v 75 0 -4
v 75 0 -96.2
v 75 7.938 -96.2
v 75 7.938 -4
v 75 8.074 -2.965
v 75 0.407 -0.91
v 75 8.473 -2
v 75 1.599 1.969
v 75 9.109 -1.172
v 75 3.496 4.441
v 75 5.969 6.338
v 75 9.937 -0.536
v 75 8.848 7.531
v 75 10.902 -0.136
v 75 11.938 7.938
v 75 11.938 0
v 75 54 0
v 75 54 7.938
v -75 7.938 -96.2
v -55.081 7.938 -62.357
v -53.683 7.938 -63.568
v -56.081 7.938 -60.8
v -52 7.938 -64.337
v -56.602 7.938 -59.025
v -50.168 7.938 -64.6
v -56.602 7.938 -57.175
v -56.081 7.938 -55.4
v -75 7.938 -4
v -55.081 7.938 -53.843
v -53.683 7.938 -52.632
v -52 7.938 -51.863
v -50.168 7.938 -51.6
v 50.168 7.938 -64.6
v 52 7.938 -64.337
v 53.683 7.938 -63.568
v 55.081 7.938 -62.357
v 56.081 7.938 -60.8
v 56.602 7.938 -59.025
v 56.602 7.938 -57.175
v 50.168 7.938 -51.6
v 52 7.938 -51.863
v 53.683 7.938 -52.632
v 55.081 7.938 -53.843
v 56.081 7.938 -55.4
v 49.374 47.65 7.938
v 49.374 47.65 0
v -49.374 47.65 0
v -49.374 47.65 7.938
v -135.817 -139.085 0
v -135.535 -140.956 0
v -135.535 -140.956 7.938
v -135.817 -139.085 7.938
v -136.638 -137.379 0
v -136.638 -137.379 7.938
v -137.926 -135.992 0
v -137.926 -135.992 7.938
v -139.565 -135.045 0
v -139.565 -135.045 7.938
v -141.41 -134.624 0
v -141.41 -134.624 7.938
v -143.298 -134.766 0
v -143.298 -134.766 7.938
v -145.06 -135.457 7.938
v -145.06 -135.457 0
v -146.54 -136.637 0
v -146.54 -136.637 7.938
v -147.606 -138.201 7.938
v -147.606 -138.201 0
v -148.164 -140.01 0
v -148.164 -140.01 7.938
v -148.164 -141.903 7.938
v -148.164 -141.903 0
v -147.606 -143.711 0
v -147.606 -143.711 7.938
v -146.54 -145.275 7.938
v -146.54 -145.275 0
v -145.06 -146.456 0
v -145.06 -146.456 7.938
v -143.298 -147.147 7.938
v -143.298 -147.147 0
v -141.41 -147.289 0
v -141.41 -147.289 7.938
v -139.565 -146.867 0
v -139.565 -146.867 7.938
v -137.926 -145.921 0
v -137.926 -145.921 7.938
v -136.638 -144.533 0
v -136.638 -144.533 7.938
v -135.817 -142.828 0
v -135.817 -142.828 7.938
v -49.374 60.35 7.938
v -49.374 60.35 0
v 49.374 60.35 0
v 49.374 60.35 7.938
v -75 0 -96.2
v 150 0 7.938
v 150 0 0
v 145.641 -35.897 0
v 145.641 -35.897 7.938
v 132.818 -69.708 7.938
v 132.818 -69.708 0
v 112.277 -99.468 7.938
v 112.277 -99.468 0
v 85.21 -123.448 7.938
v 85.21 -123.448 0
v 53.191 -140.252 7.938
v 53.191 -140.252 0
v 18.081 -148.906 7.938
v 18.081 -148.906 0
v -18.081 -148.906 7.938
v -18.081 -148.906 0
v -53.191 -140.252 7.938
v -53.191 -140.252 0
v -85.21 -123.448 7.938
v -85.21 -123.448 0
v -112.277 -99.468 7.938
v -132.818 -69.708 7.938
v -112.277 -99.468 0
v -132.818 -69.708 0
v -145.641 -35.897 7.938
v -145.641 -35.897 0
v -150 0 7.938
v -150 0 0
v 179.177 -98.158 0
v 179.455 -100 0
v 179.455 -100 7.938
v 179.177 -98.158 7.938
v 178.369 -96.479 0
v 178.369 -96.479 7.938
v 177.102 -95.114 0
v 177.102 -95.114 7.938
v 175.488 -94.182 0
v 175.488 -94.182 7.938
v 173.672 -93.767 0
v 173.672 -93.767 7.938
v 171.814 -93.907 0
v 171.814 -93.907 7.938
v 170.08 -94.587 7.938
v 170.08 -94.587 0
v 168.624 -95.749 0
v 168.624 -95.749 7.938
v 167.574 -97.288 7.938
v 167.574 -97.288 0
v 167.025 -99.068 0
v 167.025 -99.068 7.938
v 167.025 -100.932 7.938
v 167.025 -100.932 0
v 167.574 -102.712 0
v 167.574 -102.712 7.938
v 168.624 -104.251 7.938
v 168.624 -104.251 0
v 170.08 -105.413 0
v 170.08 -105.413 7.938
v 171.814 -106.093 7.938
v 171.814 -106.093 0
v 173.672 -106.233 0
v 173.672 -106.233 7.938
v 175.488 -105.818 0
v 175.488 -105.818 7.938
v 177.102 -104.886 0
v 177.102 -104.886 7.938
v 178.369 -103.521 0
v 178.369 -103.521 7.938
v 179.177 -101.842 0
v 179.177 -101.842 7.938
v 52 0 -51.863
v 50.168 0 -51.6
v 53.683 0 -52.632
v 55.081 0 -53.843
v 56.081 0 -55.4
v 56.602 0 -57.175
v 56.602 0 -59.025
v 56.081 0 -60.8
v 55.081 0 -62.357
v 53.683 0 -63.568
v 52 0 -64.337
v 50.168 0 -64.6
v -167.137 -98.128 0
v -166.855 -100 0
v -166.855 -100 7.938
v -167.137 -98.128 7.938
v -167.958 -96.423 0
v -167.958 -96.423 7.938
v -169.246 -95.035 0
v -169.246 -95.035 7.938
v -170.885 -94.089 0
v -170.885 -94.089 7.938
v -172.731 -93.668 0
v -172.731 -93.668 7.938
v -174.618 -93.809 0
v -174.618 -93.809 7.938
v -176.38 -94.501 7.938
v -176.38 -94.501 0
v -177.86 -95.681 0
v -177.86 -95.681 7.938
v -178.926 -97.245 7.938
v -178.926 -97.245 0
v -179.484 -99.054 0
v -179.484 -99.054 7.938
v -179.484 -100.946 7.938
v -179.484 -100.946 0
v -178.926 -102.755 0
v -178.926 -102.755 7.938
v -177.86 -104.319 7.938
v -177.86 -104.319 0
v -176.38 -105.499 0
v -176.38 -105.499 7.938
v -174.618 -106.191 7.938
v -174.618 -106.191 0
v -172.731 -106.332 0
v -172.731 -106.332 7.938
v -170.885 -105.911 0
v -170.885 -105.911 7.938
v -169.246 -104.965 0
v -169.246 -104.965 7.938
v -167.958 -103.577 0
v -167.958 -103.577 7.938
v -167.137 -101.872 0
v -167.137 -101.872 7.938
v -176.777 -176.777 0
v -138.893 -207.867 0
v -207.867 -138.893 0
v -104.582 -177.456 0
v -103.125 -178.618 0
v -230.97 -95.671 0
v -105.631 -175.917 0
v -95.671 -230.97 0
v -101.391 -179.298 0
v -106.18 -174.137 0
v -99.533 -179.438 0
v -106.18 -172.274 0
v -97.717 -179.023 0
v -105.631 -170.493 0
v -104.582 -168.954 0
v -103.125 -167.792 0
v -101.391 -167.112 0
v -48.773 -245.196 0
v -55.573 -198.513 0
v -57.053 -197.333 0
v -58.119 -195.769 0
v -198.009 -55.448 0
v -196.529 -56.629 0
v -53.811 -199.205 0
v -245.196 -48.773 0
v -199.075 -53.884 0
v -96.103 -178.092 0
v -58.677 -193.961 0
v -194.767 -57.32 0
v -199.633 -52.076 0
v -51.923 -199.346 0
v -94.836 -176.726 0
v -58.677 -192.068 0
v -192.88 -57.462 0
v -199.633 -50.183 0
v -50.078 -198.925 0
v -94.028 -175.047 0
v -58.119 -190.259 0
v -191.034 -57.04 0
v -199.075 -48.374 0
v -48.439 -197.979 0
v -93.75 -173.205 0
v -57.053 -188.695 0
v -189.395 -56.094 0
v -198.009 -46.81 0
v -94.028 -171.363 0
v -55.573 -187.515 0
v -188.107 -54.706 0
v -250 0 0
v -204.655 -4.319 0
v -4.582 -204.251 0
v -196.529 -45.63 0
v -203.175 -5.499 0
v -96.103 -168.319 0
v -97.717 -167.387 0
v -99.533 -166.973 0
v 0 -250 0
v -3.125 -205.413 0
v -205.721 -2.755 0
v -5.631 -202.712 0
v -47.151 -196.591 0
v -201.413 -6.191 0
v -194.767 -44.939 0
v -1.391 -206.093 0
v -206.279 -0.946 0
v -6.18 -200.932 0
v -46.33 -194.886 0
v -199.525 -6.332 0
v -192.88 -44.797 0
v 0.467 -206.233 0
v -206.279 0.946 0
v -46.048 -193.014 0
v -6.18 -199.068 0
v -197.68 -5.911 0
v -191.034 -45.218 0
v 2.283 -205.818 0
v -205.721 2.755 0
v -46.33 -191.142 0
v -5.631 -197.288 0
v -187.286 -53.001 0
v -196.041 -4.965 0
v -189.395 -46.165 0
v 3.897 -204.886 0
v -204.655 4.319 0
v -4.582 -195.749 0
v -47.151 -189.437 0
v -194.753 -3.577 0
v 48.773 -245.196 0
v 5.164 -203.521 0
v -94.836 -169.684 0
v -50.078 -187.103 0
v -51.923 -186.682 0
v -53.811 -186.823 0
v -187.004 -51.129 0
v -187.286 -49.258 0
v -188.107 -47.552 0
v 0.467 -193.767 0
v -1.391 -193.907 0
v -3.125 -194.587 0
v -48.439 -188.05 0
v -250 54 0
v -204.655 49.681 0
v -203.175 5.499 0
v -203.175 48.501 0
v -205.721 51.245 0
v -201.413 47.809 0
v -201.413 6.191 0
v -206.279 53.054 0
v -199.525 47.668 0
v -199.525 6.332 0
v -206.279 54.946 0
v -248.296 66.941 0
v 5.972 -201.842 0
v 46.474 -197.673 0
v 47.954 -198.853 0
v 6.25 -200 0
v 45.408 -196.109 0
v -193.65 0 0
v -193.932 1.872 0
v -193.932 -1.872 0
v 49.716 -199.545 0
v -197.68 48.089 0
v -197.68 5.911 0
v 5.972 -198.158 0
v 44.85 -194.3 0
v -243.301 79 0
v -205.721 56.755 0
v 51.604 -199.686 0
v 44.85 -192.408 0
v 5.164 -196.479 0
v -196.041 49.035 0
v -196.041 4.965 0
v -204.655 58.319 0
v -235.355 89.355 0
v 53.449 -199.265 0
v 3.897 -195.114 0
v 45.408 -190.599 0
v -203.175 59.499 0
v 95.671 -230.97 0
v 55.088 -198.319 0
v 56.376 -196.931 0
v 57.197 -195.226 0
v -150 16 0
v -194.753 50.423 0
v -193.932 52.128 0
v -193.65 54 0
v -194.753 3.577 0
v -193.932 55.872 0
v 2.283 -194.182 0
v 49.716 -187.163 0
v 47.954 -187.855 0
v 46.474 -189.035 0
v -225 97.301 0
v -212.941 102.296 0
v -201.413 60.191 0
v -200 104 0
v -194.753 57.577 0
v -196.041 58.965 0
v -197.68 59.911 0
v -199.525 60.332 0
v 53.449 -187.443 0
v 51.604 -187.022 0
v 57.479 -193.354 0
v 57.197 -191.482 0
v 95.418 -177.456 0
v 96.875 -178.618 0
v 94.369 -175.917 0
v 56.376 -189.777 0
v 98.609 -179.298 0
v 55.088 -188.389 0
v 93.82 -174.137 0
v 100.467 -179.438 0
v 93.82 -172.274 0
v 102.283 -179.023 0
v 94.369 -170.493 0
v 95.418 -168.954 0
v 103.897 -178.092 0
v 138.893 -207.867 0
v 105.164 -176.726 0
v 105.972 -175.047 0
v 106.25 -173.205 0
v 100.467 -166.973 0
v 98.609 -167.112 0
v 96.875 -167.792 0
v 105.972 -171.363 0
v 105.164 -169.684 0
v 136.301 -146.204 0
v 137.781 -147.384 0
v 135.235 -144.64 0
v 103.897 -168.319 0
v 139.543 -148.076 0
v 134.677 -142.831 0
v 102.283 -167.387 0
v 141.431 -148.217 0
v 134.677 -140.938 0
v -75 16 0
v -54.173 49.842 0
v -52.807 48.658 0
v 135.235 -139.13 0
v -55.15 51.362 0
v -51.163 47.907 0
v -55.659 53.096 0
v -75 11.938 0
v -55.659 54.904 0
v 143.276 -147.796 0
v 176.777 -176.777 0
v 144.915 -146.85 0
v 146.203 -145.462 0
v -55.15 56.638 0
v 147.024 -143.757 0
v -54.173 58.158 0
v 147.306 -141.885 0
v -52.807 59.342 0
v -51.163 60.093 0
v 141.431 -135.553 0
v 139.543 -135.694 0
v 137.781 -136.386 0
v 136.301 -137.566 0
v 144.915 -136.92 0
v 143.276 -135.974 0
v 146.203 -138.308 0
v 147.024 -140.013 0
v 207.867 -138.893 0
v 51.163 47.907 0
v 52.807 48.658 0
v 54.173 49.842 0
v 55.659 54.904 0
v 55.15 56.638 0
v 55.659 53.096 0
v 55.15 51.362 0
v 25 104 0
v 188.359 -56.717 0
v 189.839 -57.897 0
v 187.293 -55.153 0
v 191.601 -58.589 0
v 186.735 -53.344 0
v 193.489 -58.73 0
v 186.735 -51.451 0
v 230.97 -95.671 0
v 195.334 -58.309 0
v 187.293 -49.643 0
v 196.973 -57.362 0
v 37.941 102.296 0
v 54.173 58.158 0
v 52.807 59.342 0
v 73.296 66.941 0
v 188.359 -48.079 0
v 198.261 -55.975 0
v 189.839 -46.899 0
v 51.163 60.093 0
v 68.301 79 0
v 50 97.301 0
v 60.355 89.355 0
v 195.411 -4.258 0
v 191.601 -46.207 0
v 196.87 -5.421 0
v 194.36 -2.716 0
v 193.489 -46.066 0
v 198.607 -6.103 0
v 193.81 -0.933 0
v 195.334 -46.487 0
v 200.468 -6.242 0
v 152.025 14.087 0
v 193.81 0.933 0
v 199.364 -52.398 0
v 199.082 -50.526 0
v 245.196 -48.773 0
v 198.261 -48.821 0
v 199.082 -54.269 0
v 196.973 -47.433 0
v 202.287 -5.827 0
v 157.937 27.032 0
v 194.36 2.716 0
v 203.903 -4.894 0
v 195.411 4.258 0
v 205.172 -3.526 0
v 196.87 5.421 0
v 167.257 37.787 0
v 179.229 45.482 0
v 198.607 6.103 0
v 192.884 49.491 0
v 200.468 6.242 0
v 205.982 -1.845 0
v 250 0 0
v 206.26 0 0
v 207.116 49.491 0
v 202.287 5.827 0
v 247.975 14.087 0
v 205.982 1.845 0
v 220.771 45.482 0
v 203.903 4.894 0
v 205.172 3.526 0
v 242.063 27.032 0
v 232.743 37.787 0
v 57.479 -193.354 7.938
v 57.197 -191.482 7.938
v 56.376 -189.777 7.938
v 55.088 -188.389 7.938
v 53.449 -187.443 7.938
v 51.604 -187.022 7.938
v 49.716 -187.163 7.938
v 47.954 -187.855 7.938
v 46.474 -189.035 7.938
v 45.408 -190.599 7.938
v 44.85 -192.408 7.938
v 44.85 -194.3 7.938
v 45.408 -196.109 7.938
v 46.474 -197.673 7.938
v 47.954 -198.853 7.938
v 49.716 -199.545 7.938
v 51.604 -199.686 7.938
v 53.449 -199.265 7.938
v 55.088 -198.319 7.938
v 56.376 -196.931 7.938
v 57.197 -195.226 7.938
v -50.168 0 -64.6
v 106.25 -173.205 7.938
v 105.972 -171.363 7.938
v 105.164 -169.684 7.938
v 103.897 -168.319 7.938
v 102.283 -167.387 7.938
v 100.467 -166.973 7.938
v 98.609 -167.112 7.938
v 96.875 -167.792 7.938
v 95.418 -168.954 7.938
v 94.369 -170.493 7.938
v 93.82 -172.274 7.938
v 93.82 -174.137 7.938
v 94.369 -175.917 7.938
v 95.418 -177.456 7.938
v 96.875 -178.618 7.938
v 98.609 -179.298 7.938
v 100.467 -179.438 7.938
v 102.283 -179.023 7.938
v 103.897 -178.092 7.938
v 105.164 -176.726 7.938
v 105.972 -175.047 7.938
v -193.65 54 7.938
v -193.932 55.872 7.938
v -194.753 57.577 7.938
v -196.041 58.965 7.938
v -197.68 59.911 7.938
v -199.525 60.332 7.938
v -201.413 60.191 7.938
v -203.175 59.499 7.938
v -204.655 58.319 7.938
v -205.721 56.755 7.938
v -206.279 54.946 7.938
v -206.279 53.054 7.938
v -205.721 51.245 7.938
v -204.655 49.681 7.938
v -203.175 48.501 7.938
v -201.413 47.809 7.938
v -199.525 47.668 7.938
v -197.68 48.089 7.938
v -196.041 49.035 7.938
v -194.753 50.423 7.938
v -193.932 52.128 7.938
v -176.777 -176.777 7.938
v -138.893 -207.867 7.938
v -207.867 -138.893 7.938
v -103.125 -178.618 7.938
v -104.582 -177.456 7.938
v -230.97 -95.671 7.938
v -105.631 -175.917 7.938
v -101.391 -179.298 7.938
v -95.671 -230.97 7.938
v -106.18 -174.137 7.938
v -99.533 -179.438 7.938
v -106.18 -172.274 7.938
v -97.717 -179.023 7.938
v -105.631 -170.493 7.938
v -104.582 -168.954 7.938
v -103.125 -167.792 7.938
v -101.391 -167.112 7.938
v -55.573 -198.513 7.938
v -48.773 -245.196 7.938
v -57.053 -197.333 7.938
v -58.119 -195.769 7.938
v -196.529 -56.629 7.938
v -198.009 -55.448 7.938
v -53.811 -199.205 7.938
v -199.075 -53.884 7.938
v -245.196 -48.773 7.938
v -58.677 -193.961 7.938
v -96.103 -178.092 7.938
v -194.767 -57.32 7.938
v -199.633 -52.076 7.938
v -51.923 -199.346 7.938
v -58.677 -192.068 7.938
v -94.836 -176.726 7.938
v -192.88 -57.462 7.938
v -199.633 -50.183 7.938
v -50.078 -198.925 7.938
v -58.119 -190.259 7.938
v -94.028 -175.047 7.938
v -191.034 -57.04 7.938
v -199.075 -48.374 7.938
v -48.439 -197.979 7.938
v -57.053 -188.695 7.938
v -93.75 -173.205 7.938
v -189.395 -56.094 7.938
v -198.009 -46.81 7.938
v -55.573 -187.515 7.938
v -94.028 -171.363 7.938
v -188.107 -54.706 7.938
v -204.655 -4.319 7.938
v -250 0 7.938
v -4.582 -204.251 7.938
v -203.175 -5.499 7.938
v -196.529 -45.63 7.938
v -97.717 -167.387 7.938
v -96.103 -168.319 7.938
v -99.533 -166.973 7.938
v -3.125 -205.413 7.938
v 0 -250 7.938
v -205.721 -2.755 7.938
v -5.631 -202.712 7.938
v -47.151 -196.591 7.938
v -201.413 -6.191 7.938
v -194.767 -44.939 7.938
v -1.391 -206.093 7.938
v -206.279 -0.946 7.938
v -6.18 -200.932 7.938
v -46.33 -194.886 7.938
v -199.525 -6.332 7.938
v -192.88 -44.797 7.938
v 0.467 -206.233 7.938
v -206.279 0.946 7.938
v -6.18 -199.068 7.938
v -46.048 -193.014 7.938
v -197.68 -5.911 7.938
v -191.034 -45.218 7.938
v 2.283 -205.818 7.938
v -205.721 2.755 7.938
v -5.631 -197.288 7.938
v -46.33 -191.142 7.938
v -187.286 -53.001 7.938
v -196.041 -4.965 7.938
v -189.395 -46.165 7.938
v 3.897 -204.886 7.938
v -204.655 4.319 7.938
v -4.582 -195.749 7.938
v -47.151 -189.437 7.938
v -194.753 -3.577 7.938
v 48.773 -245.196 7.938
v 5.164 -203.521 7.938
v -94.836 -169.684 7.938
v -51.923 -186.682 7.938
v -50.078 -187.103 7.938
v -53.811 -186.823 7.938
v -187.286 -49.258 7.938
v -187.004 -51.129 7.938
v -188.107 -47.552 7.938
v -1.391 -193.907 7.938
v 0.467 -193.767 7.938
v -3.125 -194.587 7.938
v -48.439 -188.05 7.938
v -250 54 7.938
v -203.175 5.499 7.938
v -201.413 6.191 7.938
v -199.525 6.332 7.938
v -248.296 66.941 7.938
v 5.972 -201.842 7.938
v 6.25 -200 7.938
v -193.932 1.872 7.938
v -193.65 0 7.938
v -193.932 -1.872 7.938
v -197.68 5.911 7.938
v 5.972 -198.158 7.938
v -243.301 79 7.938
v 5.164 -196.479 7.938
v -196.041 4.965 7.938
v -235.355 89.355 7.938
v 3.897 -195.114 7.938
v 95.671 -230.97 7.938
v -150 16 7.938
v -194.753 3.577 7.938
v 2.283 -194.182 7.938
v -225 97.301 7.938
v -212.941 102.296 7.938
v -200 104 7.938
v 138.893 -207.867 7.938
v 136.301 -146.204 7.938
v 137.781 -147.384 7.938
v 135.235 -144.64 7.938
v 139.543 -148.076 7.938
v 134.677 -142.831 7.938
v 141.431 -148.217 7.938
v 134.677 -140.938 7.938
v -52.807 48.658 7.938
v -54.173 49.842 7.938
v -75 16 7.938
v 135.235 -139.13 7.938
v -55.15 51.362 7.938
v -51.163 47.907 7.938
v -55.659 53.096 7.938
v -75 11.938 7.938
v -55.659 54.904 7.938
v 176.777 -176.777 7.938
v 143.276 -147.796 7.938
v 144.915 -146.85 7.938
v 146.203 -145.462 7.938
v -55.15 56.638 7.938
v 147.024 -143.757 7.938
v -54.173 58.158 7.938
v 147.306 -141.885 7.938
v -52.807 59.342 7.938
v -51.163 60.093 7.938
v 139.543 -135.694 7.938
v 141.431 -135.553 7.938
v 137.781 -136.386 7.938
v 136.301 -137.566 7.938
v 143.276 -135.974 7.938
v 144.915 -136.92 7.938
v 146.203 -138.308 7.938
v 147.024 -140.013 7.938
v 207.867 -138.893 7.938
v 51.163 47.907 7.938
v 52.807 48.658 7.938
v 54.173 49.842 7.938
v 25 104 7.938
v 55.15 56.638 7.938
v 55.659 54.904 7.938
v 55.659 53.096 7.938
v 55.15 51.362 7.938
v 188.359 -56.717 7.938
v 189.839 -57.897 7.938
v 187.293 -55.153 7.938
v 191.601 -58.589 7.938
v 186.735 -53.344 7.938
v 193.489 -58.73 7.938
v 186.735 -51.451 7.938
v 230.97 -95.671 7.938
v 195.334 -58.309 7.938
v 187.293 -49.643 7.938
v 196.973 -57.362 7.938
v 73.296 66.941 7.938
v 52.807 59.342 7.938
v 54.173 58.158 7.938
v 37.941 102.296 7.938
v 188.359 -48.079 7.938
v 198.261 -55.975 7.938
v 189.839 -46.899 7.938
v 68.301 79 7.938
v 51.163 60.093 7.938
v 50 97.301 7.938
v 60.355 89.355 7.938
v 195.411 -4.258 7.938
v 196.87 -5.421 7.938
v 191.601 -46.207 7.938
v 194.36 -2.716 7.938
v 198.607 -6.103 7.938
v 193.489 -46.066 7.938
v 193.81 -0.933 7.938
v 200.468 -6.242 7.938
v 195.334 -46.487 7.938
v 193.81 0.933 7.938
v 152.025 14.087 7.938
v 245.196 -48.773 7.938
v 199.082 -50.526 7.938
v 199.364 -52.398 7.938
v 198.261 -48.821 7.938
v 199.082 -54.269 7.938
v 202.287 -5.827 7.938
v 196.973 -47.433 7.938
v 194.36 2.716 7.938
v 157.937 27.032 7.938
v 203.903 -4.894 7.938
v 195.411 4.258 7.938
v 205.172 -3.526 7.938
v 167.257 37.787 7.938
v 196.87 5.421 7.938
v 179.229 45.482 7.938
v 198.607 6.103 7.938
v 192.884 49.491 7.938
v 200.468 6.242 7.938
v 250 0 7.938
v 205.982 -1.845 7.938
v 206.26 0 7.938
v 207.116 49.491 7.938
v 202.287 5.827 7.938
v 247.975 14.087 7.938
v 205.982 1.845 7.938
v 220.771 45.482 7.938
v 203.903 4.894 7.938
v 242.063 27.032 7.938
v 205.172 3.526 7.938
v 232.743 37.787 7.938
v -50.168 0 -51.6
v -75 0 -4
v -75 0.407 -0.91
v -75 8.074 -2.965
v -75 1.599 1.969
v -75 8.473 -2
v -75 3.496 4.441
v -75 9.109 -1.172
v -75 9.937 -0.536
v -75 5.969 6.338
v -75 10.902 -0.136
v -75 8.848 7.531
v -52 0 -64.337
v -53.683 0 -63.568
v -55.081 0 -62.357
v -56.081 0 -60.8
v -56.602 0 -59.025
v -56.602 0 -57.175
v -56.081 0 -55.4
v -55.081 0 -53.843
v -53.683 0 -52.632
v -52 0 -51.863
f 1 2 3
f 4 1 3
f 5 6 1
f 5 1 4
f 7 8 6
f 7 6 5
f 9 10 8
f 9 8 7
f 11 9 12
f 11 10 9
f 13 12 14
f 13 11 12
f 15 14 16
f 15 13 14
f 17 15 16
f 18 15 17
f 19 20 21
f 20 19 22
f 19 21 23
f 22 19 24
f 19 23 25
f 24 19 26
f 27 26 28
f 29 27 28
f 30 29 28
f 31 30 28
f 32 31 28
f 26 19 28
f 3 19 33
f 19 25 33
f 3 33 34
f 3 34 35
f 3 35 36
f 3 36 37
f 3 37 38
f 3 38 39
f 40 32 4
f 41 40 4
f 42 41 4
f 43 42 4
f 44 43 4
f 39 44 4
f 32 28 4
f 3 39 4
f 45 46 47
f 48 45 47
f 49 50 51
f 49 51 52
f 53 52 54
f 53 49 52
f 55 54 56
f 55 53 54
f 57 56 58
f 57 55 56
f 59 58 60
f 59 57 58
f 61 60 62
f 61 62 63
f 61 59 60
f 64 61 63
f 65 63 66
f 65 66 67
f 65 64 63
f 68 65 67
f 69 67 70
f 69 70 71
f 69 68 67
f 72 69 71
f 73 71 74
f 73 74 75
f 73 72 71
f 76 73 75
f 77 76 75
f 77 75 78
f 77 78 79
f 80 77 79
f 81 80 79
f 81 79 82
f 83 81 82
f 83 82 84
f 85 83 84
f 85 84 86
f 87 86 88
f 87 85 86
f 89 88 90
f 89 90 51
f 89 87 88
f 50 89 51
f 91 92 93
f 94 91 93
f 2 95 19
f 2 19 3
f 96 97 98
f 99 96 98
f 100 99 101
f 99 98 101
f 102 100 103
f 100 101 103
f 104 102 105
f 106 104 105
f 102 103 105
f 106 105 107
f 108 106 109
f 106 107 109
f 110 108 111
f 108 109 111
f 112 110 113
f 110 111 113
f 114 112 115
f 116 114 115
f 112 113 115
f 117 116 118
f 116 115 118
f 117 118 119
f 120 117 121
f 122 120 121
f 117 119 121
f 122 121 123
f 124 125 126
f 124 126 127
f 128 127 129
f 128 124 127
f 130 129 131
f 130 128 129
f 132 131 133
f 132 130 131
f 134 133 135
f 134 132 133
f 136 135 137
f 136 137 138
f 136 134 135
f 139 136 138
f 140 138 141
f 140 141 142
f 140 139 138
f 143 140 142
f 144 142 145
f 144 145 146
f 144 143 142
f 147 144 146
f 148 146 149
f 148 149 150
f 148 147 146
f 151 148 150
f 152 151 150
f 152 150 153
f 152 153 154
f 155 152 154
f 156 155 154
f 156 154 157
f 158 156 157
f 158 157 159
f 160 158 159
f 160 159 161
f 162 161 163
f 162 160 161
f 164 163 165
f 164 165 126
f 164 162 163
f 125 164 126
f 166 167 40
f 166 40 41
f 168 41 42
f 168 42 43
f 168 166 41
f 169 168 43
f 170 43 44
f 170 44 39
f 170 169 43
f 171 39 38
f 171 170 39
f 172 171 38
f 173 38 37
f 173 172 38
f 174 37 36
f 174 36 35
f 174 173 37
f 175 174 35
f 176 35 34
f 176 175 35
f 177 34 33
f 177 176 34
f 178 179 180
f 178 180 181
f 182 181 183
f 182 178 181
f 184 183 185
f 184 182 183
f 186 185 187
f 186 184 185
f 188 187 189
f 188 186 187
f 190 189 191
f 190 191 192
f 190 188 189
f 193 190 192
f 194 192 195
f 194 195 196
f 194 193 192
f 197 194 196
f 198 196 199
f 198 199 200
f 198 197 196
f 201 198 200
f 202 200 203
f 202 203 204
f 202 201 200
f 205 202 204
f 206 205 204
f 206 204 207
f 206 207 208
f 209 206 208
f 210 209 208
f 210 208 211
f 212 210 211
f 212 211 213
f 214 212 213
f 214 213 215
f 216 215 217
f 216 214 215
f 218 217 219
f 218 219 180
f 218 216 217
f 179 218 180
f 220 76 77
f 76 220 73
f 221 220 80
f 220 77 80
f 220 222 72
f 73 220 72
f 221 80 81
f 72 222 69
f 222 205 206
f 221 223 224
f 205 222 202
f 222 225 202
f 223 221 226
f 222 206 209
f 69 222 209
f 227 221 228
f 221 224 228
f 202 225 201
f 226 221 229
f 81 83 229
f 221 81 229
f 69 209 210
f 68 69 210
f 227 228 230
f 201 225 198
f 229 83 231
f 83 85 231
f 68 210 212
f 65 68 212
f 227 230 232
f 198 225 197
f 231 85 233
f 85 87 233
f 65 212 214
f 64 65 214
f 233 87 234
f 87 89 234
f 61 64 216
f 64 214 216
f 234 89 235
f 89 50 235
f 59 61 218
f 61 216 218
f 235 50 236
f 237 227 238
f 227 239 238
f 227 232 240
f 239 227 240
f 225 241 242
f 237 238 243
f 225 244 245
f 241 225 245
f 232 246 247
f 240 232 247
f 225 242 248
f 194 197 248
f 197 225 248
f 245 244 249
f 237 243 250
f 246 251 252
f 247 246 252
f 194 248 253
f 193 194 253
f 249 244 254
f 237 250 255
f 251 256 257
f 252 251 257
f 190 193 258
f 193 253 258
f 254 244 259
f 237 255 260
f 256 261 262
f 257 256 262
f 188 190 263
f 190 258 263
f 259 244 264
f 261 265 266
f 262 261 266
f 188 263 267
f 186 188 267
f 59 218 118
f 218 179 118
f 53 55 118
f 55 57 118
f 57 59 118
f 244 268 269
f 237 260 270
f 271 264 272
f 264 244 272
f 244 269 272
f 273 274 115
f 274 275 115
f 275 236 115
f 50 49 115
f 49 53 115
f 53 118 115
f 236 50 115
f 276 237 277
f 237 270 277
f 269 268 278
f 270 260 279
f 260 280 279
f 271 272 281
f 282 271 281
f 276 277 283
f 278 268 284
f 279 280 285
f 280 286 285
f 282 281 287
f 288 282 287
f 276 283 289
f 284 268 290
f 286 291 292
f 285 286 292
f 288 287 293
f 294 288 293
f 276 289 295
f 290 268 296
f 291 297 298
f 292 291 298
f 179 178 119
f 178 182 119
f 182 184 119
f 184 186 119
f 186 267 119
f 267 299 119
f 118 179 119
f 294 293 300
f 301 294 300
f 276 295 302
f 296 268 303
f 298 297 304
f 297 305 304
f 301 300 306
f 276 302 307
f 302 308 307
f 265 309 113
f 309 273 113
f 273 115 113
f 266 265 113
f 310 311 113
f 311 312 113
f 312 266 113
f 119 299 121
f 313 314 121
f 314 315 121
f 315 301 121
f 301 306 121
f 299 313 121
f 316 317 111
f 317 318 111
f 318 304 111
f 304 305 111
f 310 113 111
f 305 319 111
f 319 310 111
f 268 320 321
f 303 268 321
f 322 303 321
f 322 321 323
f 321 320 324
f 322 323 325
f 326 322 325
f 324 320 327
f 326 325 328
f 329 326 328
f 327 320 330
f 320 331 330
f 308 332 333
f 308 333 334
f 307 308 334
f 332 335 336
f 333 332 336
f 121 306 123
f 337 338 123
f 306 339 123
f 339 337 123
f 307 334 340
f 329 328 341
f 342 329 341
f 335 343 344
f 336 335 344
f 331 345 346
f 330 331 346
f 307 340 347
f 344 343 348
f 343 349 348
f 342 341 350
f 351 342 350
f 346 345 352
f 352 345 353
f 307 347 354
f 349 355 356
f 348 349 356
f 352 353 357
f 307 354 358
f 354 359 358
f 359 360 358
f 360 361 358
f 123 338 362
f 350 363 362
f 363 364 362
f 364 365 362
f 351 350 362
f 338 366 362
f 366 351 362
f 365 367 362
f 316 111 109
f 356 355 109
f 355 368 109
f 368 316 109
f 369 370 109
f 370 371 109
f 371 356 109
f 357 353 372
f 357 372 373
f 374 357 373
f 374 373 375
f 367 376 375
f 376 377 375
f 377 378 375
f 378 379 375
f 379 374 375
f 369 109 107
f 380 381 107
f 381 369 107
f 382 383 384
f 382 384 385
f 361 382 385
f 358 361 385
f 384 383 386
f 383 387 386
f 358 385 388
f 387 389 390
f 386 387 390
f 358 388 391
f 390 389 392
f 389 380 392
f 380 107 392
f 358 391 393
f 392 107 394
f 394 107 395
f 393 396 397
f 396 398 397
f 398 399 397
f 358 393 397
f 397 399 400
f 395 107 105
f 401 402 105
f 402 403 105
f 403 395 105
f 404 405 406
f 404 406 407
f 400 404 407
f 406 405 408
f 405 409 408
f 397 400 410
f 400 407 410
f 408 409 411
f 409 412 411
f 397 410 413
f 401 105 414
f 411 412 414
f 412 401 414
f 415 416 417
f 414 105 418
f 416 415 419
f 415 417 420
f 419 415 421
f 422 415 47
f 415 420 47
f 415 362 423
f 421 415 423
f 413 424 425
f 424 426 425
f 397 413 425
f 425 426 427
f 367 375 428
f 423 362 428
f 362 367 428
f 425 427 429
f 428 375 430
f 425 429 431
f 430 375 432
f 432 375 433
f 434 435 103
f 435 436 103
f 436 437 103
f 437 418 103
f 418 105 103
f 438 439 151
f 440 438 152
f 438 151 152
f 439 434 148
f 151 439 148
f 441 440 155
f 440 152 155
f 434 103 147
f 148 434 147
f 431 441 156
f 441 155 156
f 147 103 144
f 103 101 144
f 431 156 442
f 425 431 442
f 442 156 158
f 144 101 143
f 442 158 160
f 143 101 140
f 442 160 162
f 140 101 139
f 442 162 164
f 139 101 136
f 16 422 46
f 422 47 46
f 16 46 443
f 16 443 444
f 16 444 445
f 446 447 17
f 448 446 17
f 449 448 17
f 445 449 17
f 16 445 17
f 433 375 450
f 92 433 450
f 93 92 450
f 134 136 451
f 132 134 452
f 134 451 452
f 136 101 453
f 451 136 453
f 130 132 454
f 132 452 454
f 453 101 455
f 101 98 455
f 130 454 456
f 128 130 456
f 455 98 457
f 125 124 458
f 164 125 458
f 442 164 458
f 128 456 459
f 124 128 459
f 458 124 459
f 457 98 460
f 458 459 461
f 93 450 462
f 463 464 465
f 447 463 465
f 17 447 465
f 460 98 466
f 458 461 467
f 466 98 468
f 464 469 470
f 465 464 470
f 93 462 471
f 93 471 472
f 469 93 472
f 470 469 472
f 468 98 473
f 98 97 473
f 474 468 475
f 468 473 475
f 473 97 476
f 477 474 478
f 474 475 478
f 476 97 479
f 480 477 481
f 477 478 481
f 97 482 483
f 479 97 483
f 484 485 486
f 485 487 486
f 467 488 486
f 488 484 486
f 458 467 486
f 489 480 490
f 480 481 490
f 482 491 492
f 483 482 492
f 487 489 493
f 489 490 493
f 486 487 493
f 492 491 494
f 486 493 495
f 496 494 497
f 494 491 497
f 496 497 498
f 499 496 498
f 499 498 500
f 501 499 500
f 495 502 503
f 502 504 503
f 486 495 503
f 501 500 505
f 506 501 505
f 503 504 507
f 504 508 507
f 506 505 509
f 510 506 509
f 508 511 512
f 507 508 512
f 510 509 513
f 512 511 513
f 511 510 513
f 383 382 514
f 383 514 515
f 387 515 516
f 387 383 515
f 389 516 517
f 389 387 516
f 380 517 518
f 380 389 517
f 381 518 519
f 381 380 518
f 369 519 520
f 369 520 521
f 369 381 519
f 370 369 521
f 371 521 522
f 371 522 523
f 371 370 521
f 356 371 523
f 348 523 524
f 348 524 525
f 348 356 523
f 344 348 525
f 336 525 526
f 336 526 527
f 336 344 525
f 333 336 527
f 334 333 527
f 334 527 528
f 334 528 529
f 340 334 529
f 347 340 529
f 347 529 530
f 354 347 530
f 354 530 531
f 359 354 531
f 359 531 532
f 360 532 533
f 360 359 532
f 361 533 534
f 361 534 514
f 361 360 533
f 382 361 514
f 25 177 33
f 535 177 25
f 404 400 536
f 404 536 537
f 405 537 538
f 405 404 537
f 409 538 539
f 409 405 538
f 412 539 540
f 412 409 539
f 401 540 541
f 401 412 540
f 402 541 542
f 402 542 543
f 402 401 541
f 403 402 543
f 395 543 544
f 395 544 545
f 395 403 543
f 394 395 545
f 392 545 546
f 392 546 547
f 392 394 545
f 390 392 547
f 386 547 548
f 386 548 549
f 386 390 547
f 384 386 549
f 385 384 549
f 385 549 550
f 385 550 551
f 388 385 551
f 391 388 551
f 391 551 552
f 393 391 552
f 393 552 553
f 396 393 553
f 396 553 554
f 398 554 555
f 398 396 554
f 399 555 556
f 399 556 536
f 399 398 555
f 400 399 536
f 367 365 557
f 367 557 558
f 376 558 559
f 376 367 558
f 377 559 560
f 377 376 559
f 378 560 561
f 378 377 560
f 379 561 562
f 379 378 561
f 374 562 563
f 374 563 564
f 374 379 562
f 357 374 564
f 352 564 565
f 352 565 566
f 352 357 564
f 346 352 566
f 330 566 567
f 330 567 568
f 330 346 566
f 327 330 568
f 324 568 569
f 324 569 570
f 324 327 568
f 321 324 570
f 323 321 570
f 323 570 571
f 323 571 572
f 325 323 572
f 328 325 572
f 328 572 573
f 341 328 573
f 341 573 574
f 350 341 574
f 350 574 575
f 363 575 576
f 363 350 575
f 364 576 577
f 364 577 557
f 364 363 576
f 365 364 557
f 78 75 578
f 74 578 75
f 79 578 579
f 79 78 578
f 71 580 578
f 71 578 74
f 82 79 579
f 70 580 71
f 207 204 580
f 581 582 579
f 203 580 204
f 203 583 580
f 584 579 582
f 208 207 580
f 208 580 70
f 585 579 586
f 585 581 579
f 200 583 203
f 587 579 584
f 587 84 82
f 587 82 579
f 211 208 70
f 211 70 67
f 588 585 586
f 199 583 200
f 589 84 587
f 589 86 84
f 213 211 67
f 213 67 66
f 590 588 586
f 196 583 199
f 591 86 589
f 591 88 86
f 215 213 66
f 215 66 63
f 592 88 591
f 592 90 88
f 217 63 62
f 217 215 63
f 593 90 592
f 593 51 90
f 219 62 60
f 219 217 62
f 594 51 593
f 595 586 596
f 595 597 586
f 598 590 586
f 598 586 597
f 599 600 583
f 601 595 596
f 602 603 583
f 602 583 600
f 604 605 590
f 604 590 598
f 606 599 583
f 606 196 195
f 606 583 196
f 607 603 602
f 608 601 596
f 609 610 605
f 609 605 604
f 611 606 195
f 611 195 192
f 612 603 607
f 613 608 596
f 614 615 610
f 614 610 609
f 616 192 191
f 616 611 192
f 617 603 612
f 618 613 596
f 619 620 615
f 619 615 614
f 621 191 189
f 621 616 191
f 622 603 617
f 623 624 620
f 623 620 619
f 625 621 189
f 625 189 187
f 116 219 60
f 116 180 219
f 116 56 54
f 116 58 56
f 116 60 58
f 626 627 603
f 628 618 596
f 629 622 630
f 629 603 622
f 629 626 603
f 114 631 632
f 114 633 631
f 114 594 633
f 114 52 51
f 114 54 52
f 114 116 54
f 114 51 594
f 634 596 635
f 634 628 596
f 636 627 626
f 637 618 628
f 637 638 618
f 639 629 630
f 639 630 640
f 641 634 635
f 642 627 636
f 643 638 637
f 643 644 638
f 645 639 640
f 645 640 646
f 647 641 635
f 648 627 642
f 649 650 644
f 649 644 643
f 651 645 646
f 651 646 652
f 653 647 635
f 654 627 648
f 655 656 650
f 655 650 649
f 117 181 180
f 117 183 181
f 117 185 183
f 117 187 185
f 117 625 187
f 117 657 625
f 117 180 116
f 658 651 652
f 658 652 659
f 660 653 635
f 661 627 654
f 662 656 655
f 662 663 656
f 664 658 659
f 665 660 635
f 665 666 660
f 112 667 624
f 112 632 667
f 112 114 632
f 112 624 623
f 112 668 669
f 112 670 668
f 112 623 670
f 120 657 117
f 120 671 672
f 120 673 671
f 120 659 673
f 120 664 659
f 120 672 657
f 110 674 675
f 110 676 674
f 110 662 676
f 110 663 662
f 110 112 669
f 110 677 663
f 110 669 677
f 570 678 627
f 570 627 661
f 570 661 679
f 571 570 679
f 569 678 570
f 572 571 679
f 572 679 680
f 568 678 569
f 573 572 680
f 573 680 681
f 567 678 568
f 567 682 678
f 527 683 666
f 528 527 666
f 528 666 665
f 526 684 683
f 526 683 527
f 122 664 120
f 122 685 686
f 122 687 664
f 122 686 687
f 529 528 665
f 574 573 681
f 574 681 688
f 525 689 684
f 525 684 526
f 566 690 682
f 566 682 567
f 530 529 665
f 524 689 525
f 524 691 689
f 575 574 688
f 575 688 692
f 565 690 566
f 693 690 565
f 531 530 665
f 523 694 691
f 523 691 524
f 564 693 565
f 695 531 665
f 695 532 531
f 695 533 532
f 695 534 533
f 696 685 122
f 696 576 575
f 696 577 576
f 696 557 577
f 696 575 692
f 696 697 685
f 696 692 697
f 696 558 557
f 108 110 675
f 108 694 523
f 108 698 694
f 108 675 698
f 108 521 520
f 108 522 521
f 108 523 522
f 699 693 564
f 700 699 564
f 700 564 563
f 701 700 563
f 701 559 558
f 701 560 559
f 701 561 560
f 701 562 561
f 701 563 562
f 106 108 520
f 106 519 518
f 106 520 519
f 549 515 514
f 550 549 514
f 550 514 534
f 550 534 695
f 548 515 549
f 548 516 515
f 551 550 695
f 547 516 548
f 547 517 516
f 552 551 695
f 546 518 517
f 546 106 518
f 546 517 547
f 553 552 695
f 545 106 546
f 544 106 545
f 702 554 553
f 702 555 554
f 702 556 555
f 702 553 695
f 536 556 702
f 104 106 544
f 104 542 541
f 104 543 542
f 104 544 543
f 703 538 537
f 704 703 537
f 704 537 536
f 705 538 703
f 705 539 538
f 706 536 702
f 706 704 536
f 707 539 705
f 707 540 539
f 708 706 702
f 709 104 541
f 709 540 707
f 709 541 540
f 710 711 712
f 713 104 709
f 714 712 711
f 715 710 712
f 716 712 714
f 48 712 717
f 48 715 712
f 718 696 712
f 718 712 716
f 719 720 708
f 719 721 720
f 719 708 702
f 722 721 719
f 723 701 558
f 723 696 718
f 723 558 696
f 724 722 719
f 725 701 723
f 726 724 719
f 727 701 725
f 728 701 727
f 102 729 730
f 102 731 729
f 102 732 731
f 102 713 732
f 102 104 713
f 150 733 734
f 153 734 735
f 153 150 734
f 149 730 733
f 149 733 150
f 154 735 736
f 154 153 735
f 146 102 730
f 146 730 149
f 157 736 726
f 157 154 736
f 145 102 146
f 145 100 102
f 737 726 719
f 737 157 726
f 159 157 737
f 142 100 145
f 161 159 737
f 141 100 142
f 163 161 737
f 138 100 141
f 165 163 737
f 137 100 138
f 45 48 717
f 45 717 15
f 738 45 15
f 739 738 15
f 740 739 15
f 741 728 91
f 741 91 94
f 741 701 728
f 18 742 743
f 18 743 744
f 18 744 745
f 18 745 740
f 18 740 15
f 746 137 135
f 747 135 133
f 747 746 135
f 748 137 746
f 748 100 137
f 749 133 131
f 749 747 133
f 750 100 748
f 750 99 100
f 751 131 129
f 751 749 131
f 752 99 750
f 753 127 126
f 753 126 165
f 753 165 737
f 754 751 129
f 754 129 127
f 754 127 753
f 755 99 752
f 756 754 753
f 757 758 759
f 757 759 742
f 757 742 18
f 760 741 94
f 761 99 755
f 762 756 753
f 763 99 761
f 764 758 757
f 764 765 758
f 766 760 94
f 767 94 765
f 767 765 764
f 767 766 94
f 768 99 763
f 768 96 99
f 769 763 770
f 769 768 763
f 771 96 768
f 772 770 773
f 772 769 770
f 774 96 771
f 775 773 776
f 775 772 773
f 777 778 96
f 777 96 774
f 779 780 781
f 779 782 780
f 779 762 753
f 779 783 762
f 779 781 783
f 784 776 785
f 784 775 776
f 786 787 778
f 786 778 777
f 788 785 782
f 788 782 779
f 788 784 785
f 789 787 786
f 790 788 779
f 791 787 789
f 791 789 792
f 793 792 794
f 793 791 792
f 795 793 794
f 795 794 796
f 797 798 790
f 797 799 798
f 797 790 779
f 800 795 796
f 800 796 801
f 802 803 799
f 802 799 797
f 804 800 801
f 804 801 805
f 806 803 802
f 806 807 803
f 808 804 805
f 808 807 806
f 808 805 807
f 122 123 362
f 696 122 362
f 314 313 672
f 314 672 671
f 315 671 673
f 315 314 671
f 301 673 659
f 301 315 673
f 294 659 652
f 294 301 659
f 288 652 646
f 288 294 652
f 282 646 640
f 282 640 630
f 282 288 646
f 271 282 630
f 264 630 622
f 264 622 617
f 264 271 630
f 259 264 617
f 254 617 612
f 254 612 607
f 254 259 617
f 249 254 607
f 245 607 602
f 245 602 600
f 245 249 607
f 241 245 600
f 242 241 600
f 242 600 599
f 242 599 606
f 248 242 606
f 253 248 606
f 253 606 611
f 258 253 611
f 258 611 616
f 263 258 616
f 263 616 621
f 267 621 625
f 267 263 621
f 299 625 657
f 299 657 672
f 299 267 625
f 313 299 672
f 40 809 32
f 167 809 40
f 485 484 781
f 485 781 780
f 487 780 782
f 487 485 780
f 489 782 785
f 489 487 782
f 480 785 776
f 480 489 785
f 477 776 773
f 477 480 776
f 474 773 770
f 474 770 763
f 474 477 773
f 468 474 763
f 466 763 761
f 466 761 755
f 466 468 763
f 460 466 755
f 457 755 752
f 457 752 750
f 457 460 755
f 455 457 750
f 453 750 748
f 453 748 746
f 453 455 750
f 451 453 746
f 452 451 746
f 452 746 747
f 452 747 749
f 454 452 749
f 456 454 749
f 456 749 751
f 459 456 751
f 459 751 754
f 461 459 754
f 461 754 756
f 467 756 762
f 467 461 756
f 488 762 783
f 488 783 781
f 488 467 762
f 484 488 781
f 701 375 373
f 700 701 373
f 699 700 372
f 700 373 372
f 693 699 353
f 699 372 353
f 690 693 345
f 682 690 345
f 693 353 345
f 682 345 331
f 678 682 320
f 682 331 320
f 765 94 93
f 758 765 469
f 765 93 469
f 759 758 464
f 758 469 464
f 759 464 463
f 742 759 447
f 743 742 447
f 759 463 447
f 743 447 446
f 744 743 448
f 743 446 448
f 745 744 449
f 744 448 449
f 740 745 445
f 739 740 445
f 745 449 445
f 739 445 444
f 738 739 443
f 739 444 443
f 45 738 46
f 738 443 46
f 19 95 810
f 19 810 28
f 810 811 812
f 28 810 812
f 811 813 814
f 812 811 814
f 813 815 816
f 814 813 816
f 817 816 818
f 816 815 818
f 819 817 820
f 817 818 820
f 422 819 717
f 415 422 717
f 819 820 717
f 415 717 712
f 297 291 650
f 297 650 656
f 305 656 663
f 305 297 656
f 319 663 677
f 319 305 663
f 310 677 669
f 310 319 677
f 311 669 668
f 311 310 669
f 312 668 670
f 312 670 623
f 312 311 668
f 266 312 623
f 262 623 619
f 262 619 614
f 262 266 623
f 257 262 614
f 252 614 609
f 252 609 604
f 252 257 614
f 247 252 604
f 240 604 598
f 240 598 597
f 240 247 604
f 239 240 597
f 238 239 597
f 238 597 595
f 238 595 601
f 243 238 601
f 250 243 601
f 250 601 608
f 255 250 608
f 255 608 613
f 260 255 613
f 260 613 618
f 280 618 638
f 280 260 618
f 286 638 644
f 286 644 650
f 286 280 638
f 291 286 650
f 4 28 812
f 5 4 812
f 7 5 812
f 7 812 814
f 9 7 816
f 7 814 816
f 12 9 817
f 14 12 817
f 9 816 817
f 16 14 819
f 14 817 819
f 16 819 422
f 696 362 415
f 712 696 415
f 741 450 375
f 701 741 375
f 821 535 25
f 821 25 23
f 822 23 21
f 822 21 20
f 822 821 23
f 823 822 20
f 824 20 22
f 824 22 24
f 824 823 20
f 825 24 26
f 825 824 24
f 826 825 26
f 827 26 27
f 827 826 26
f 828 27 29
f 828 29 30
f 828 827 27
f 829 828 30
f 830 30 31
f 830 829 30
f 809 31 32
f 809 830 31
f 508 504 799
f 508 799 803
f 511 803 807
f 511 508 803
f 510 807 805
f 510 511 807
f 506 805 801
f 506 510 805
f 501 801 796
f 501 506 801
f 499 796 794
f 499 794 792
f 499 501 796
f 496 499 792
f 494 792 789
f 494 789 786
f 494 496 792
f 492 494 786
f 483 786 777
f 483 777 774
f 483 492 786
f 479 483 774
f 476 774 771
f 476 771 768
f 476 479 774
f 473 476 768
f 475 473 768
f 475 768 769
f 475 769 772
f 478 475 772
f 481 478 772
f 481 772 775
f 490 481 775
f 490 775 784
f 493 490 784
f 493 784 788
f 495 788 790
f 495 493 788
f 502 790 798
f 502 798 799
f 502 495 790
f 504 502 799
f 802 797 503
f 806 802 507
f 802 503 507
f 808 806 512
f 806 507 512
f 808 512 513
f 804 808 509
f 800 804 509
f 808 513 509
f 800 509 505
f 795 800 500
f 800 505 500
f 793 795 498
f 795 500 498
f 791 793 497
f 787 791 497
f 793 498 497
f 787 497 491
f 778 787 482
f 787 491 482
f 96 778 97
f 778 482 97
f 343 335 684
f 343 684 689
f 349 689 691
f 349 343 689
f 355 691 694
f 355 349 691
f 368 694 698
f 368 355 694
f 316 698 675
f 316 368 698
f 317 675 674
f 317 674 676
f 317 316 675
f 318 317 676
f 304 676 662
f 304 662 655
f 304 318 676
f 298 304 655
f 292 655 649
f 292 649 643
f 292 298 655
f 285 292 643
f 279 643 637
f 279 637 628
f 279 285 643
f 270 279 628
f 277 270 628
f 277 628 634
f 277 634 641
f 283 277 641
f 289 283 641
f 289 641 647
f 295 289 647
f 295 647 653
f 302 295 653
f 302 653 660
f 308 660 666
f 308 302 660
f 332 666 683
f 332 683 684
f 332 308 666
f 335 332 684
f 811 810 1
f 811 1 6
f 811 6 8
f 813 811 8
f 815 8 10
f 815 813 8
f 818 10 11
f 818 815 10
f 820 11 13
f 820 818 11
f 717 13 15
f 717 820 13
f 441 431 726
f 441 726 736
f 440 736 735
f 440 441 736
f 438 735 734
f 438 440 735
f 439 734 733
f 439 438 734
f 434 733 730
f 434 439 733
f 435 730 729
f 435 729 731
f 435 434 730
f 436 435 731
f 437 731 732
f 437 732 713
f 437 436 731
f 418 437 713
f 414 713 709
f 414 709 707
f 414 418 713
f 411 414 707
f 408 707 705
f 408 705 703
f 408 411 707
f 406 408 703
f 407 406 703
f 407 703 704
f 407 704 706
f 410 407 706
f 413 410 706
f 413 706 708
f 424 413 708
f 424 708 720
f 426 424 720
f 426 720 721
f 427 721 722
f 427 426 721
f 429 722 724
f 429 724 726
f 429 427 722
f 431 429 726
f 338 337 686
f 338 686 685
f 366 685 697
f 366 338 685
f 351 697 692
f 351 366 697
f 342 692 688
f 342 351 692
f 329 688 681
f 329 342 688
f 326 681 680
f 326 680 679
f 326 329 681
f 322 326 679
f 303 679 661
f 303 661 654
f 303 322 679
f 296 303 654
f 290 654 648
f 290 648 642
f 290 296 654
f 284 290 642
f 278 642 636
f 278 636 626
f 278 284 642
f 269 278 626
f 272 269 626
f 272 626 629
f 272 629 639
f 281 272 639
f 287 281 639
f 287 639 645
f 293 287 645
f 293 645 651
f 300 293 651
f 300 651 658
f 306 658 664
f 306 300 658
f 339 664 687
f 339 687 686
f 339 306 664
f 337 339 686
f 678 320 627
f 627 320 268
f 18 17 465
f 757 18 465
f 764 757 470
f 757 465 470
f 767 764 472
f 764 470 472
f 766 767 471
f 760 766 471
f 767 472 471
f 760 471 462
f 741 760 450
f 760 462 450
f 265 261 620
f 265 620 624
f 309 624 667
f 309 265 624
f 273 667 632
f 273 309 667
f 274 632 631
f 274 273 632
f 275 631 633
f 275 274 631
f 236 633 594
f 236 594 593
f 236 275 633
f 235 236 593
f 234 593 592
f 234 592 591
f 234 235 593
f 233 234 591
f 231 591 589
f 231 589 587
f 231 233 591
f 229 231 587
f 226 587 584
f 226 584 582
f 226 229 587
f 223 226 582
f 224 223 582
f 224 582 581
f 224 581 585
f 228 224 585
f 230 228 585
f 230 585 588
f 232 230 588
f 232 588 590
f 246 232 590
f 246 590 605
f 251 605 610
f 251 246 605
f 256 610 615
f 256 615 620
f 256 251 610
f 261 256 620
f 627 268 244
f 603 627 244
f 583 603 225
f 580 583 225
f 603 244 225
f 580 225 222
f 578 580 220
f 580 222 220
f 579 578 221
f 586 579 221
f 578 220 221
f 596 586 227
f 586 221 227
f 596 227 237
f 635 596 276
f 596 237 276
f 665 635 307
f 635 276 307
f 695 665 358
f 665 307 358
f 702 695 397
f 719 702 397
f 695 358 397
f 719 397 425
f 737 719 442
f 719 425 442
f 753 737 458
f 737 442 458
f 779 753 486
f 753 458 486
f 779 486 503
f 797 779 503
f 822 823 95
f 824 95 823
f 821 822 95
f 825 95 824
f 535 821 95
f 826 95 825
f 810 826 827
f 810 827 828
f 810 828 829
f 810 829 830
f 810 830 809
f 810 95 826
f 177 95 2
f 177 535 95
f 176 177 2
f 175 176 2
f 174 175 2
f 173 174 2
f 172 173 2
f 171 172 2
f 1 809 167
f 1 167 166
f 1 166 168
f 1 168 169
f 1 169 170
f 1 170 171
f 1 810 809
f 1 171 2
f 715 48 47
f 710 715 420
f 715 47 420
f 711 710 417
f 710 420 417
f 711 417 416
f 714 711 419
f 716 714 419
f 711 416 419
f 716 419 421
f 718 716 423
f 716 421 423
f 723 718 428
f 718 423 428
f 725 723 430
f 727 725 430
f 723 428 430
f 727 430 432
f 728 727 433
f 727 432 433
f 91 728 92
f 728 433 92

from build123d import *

# Parameters (mm, degrees)
CROQUIS1_R                = 6.35
CROQUIS1_R_2              = 6.26
CROQUIS1_R_3              = 6.25
SALIENTE_EXTRUIR1_DEPTH   = 7.9375
CROQUIS2_W                = 150
CROQUIS2_H                = 104.1375
SALIENTE_EXTRUIR2_DEPTH   = 7.9375
CONVERTIR_S_LIDO1_START   = -75
CONVERTIR_S_LIDO1_DEPTH   = 150
CONVERTIR_S_LIDO1_2_DEPTH = 150


# Read off the part's stored shape, not the designer's step: Convertir-Sólido1
with BuildPart() as part:
    # Croquis1 → Saliente-Extruir1 (new body)
    with BuildSketch(Plane.XY):
        with BuildLine():
            Line((-75, 16), (-75, 0))
            Line((-75, 0), (75, 0))
            Line((75, 0), (75, 54))
            ThreePointArc((75, 54), (60.355339059, 89.355339059), (25, 104))
            Line((25, 104), (-200, 104))
            ThreePointArc((-200, 104), (-235.355339059, 89.355339059), (-250, 54))
            Line((-250, 54), (-250, 0))
            ThreePointArc((-250, 0), (0, -250), (250, 0))
            ThreePointArc((250, 0), (200, 50), (150, 0))
            ThreePointArc((150, 0), (0, -150), (-150, 0))
            Line((-150, 0), (-150, 16))
            Line((-150, 16), (-75, 16))
        make_face()
        with BuildLine():
            ThreePointArc((-49.374105038, 47.65), (-55.724105038, 54), (-49.374105038, 60.35))
            Line((-49.374105038, 60.35), (49.374105038, 60.35))
            ThreePointArc((49.374105038, 60.35), (55.724105038, 54), (49.374105038, 47.65))
            Line((49.374105038, 47.65), (-49.374105038, 47.65))
        make_face(mode=Mode.SUBTRACT)
        with Locations((193.014182094, -52.397762459)):
            Circle(CROQUIS1_R, mode=Mode.SUBTRACT)
        with Locations((200, 0)):
            Circle(CROQUIS1_R_2, mode=Mode.SUBTRACT)
        with Locations((-100, -173.205080757)):
            Circle(CROQUIS1_R_3, mode=Mode.SUBTRACT)
        with Locations((-52.397762459, -193.014182094)):
            Circle(CROQUIS1_R, mode=Mode.SUBTRACT)
        with Locations((-141.884884438, -140.956303754)):
            Circle(CROQUIS1_R, mode=Mode.SUBTRACT)
        with Locations((-173.205080757, -100)):
            Circle(CROQUIS1_R, mode=Mode.SUBTRACT)
        with Locations((0, -200)):
            Circle(CROQUIS1_R_3, mode=Mode.SUBTRACT)
        with Locations((51.129297656, -193.354066213)):
            Circle(CROQUIS1_R, mode=Mode.SUBTRACT)
        with Locations((100, -173.205080757)):
            Circle(CROQUIS1_R_3, mode=Mode.SUBTRACT)
        with Locations((140.956303754, -141.884884438)):
            Circle(CROQUIS1_R, mode=Mode.SUBTRACT)
        with Locations((173.205080757, -100)):
            Circle(CROQUIS1_R_3, mode=Mode.SUBTRACT)
        with Locations((-193.354066213, -51.129297656)):
            Circle(CROQUIS1_R, mode=Mode.SUBTRACT)
        with Locations((-200, 0)):
            Circle(CROQUIS1_R, mode=Mode.SUBTRACT)
        with Locations((-200, 54)):
            Circle(CROQUIS1_R, mode=Mode.SUBTRACT)
    extrude(amount=SALIENTE_EXTRUIR1_DEPTH)

    # Croquis2 → Saliente-Extruir2 (add)
    with BuildSketch(Plane.XZ):
        with Locations((0, -44.13125)):
            Rectangle(CROQUIS2_W, CROQUIS2_H)
        with BuildLine():
            Line((-50.16849794, -51.6), (50.16849794, -51.6))
            ThreePointArc((50.16849794, -51.6), (56.66849794, -58.1), (50.16849794, -64.6))
            Line((50.16849794, -64.6), (-50.16849794, -64.6))
            ThreePointArc((-50.16849794, -64.6), (-56.66849794, -58.1), (-50.16849794, -51.6))
        make_face(mode=Mode.SUBTRACT)
    extrude(amount=-SALIENTE_EXTRUIR2_DEPTH)

    # Convertir-Sólido1 outline → Convertir-Sólido1 (cut)
    with BuildSketch(Plane.YZ.offset(CONVERTIR_S_LIDO1_START)):
        with BuildLine():
            ThreePointArc((0, -4), (3.4964128, 4.4410872), (11.9375, 7.9375))
            Line((11.9375, 7.9375), (0, 7.9375))
            Line((0, 7.9375), (0, -4))
        make_face()
    extrude(amount=CONVERTIR_S_LIDO1_DEPTH, mode=Mode.SUBTRACT)

    # Convertir-S_lido1 2 outline → Convertir-S_lido1 2 (add)
    with BuildSketch(Plane.YZ.offset(CONVERTIR_S_LIDO1_START)):
        with BuildLine():
            Line((11.9375, 0), (7.9375, 0))
            Line((7.9375, 0), (7.9375, -4))
            ThreePointArc((7.9375, -4), (9.109072875, -1.171572875), (11.9375, 0))
        make_face()
    extrude(amount=CONVERTIR_S_LIDO1_2_DEPTH)


solid = part.part
